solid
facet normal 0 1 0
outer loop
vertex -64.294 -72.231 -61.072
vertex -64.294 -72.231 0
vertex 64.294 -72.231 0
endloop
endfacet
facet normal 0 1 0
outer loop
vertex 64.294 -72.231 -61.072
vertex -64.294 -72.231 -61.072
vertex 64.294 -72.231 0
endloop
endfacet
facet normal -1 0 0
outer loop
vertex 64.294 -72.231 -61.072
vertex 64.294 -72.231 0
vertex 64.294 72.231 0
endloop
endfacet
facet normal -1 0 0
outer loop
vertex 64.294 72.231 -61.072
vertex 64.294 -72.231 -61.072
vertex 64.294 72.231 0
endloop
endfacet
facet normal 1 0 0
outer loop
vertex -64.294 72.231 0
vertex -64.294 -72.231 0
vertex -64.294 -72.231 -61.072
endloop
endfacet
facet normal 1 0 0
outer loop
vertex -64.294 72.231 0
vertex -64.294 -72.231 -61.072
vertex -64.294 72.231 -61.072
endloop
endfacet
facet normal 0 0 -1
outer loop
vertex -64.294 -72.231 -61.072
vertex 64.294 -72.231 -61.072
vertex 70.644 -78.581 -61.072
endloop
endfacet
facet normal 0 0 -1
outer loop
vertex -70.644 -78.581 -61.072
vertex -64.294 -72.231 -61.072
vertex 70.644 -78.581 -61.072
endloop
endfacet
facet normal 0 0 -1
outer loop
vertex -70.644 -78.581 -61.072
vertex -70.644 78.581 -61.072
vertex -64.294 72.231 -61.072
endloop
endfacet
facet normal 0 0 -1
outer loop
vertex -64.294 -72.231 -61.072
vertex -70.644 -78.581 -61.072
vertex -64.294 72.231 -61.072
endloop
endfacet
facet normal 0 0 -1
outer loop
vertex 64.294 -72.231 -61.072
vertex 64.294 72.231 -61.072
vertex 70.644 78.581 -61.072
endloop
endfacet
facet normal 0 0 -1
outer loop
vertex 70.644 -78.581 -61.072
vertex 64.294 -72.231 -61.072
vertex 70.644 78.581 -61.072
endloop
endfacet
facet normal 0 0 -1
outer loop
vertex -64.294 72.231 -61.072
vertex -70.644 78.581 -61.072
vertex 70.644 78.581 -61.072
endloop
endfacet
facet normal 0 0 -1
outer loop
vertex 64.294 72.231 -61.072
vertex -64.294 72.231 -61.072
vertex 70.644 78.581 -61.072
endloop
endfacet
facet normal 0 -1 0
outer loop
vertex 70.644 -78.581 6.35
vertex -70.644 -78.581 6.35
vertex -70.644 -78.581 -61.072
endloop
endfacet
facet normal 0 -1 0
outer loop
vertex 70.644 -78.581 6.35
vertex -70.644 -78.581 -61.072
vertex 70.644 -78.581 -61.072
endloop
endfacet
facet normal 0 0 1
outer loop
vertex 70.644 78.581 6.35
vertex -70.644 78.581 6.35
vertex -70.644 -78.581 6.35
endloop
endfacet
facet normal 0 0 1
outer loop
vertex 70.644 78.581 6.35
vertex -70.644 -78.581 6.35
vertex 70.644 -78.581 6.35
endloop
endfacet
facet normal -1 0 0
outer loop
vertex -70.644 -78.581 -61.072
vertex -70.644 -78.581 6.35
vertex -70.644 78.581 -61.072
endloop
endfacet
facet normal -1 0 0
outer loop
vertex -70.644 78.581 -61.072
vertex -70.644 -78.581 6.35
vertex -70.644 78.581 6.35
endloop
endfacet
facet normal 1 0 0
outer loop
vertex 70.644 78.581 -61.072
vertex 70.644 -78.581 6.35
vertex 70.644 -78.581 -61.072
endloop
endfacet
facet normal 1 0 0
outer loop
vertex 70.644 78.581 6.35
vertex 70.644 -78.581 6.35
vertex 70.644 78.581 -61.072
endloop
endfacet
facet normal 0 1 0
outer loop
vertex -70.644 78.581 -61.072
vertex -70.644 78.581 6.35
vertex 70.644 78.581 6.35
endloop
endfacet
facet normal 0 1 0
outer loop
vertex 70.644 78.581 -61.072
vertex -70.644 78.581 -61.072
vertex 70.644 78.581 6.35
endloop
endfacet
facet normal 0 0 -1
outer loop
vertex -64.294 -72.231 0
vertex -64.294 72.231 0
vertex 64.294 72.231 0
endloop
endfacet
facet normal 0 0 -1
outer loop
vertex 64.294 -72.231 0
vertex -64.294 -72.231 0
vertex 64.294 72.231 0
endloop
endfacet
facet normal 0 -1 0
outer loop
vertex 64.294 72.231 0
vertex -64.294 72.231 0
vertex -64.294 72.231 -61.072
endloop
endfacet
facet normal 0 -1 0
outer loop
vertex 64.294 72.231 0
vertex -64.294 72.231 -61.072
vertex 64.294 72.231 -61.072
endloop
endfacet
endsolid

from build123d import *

# Parameters (mm, degrees)
SKETCH1_W           = 128.5875
SKETCH1_H           = 144.4625
BOSS_EXTRUDE1_DEPTH = 61.07176
SHELL1_T            = 6.35


with BuildPart() as part:
    # Sketch1 → Boss-Extrude1 (new body)
    with BuildSketch(Plane.XY):
        Rectangle(SKETCH1_W, SKETCH1_H)
    extrude(amount=-BOSS_EXTRUDE1_DEPTH)

    # Shell1
    shell1_openings = [part.faces().sort_by_distance(p)[0] for p in [
        (0, 0, -61.07176),
    ]]
    offset(amount=SHELL1_T, openings=shell1_openings, kind=Kind.INTERSECTION)


solid = part.part
